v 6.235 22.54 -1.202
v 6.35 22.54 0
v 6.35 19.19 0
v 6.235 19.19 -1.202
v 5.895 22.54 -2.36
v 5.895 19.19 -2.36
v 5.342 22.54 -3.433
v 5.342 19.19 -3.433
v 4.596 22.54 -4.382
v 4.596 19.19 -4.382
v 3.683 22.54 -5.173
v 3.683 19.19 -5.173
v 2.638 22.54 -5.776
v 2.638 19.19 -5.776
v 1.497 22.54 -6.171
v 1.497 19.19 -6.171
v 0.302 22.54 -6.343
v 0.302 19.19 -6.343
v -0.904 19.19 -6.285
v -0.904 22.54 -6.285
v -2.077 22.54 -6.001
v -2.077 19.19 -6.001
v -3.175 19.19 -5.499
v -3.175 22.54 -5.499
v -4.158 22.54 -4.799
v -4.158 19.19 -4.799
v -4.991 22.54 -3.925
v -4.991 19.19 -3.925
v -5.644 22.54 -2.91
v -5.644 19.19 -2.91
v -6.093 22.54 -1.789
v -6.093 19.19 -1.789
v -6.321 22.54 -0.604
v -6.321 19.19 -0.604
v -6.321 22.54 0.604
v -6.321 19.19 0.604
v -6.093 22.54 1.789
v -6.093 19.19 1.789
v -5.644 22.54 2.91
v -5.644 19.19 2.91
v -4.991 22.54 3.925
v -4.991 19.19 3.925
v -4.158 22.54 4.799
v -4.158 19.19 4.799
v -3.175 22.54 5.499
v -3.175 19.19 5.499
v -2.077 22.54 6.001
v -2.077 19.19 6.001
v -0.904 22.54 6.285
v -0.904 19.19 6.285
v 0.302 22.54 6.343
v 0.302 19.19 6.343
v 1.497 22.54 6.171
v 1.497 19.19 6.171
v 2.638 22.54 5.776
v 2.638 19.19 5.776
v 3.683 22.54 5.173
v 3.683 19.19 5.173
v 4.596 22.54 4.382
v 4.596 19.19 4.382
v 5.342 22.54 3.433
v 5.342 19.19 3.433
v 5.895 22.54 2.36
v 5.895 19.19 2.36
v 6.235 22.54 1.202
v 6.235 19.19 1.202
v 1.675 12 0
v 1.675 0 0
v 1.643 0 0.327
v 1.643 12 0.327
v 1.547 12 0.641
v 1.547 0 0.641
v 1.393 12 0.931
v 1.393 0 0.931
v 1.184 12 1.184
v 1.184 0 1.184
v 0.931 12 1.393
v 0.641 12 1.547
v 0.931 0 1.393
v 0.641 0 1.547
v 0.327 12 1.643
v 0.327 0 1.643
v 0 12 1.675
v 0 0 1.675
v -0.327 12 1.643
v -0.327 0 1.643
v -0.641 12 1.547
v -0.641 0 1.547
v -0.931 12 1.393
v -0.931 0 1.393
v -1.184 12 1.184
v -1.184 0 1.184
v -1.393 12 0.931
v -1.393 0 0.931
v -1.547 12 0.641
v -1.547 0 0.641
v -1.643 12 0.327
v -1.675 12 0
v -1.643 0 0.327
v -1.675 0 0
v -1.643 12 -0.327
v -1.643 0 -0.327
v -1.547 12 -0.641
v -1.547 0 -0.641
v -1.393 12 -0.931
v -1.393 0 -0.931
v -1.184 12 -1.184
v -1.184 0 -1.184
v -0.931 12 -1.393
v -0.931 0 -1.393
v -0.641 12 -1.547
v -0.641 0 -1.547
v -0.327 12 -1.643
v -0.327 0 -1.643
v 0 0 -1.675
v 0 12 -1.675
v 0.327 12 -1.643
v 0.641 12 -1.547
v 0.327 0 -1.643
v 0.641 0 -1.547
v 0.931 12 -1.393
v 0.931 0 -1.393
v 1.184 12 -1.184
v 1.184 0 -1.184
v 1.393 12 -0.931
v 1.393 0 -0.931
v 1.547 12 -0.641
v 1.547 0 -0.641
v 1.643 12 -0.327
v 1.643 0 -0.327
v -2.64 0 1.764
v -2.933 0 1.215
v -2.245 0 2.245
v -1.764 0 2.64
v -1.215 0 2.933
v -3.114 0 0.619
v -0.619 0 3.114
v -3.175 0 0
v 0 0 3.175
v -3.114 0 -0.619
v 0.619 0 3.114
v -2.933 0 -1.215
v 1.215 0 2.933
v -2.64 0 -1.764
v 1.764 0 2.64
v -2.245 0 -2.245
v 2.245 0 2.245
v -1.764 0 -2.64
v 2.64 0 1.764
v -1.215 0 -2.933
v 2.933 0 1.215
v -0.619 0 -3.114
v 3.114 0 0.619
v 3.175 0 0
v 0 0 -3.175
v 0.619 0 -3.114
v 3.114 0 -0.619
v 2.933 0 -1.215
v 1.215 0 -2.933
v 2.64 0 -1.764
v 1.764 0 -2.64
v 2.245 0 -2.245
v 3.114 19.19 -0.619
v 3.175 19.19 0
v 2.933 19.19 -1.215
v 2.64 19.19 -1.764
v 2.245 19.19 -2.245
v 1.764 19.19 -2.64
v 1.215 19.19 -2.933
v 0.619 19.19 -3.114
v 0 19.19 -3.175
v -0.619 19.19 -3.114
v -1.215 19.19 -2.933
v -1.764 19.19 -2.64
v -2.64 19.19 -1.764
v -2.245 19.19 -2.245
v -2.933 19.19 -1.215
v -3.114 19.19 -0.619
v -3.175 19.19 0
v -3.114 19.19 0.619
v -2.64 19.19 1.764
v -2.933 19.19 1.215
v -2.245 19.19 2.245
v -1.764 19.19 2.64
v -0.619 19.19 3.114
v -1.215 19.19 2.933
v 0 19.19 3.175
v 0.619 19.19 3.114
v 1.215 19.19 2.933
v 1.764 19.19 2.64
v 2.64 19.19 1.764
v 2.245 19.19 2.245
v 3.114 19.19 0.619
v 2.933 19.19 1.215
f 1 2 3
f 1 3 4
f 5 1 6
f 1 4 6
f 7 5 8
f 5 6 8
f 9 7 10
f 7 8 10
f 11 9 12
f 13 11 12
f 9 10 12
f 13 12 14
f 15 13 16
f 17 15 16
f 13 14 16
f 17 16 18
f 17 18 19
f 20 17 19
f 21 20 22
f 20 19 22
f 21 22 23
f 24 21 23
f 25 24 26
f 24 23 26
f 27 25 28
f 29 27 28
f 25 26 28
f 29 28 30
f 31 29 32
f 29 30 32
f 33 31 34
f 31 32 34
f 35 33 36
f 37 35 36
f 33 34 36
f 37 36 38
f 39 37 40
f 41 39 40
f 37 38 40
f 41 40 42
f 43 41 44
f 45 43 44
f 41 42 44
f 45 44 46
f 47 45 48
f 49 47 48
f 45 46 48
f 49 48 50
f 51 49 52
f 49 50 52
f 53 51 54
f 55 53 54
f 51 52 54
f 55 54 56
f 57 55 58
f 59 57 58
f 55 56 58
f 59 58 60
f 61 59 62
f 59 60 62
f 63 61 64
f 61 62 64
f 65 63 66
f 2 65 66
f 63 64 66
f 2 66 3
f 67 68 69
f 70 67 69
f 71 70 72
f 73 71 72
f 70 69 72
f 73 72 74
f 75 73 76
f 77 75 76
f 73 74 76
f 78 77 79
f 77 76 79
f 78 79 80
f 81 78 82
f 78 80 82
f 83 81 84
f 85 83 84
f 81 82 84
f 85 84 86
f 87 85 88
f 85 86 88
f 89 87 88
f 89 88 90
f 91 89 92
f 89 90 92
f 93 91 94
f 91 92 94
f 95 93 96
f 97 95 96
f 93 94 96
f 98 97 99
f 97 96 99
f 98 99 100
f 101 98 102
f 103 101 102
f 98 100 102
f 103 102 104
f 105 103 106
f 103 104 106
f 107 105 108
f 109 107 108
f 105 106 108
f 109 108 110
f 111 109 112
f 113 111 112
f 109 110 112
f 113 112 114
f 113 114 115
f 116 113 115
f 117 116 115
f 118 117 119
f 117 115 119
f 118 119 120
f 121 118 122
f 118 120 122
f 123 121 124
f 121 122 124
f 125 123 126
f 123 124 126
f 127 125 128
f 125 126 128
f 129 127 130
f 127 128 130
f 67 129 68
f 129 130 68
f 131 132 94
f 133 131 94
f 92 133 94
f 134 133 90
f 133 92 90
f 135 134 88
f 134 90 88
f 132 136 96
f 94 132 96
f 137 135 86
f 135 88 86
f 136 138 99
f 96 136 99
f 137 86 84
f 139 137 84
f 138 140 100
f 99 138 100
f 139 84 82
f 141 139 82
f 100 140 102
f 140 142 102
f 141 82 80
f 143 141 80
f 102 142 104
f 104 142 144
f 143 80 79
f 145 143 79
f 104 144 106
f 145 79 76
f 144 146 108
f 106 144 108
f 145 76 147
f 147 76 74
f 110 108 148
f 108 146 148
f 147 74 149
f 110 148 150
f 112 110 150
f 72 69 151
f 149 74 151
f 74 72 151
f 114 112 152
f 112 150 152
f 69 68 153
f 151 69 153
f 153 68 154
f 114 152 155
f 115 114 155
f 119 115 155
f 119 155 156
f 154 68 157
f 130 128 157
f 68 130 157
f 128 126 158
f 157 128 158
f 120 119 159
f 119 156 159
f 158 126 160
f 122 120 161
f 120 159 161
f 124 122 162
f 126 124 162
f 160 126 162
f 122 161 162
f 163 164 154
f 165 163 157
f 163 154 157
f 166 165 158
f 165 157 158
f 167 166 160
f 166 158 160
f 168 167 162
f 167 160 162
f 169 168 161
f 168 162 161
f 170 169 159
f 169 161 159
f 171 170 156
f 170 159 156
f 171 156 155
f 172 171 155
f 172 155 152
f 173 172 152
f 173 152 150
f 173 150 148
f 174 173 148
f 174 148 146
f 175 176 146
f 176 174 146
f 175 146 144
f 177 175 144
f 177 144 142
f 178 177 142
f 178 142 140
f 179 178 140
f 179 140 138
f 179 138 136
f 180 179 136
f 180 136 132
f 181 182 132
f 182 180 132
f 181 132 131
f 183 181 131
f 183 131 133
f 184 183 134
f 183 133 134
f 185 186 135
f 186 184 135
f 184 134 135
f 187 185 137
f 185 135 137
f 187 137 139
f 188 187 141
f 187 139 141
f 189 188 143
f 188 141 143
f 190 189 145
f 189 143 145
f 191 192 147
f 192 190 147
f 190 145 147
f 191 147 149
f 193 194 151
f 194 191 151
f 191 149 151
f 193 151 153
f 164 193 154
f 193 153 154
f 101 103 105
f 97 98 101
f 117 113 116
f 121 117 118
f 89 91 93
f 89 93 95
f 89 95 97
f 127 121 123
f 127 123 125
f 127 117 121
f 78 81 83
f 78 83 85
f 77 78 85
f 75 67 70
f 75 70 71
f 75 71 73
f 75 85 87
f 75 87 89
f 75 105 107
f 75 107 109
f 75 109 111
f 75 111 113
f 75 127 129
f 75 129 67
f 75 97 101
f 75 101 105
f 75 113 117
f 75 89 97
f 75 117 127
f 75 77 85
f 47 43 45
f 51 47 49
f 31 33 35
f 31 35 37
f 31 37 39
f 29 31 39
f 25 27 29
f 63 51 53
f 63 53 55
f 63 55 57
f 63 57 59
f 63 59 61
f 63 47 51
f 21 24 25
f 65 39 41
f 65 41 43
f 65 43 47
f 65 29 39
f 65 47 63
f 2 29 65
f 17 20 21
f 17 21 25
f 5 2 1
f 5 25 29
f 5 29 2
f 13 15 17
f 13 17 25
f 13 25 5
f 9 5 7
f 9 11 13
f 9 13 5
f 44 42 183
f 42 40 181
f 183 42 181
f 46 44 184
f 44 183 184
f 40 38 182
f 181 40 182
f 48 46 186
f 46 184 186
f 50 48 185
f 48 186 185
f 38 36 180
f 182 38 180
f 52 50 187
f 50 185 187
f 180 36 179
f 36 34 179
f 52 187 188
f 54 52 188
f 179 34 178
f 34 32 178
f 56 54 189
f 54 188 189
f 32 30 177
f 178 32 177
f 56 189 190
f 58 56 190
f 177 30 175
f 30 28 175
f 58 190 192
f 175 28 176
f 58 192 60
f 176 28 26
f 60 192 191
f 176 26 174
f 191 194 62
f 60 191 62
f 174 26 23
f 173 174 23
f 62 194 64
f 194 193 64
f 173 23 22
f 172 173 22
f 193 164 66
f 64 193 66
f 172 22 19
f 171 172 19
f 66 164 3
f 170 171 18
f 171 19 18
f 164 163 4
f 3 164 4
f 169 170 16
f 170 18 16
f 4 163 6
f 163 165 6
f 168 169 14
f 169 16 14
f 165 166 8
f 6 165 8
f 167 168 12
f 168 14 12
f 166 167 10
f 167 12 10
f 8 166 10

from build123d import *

# Parameters (mm, degrees)
SKETCH1_R           = 3.175
BOSS_EXTRUDE1_DEPTH = 20
SKETCH2_R           = 1.675
CUT_EXTRUDE1_DEPTH  = 12
SKETCH4_R           = 6.35
BOSS_EXTRUDE2_DEPTH = 2.54
SKETCH6_R           = 6.35
BOSS_EXTRUDE3_DEPTH = 3.35


with BuildPart() as part:
    # Sketch1 → Boss-Extrude1 (new body)
    with BuildSketch(Plane(origin=(0, 0, 0), x_dir=(1, 0, 0), z_dir=(0, 1, 0))):
        Circle(SKETCH1_R)
    extrude(amount=BOSS_EXTRUDE1_DEPTH)

    # Sketch2 → Cut-Extrude1 (cut)
    with BuildSketch(Plane.XZ):
        Circle(SKETCH2_R)
    extrude(amount=-CUT_EXTRUDE1_DEPTH, mode=Mode.SUBTRACT)

    # Sketch4 → Boss-Extrude2 (add)
    with BuildSketch(Plane(origin=(0, 20, 0), x_dir=(1, 0, 0), z_dir=(0, 1, 0))):
        Circle(SKETCH4_R)
    extrude(amount=BOSS_EXTRUDE2_DEPTH)

    # Sketch6 → Boss-Extrude3 (add)
    with BuildSketch(Plane(origin=(0, 22.54, 0), x_dir=(1, 0, 0), z_dir=(0, 1, 0))):
        Circle(SKETCH6_R)
    extrude(amount=-BOSS_EXTRUDE3_DEPTH)


solid = part.part
